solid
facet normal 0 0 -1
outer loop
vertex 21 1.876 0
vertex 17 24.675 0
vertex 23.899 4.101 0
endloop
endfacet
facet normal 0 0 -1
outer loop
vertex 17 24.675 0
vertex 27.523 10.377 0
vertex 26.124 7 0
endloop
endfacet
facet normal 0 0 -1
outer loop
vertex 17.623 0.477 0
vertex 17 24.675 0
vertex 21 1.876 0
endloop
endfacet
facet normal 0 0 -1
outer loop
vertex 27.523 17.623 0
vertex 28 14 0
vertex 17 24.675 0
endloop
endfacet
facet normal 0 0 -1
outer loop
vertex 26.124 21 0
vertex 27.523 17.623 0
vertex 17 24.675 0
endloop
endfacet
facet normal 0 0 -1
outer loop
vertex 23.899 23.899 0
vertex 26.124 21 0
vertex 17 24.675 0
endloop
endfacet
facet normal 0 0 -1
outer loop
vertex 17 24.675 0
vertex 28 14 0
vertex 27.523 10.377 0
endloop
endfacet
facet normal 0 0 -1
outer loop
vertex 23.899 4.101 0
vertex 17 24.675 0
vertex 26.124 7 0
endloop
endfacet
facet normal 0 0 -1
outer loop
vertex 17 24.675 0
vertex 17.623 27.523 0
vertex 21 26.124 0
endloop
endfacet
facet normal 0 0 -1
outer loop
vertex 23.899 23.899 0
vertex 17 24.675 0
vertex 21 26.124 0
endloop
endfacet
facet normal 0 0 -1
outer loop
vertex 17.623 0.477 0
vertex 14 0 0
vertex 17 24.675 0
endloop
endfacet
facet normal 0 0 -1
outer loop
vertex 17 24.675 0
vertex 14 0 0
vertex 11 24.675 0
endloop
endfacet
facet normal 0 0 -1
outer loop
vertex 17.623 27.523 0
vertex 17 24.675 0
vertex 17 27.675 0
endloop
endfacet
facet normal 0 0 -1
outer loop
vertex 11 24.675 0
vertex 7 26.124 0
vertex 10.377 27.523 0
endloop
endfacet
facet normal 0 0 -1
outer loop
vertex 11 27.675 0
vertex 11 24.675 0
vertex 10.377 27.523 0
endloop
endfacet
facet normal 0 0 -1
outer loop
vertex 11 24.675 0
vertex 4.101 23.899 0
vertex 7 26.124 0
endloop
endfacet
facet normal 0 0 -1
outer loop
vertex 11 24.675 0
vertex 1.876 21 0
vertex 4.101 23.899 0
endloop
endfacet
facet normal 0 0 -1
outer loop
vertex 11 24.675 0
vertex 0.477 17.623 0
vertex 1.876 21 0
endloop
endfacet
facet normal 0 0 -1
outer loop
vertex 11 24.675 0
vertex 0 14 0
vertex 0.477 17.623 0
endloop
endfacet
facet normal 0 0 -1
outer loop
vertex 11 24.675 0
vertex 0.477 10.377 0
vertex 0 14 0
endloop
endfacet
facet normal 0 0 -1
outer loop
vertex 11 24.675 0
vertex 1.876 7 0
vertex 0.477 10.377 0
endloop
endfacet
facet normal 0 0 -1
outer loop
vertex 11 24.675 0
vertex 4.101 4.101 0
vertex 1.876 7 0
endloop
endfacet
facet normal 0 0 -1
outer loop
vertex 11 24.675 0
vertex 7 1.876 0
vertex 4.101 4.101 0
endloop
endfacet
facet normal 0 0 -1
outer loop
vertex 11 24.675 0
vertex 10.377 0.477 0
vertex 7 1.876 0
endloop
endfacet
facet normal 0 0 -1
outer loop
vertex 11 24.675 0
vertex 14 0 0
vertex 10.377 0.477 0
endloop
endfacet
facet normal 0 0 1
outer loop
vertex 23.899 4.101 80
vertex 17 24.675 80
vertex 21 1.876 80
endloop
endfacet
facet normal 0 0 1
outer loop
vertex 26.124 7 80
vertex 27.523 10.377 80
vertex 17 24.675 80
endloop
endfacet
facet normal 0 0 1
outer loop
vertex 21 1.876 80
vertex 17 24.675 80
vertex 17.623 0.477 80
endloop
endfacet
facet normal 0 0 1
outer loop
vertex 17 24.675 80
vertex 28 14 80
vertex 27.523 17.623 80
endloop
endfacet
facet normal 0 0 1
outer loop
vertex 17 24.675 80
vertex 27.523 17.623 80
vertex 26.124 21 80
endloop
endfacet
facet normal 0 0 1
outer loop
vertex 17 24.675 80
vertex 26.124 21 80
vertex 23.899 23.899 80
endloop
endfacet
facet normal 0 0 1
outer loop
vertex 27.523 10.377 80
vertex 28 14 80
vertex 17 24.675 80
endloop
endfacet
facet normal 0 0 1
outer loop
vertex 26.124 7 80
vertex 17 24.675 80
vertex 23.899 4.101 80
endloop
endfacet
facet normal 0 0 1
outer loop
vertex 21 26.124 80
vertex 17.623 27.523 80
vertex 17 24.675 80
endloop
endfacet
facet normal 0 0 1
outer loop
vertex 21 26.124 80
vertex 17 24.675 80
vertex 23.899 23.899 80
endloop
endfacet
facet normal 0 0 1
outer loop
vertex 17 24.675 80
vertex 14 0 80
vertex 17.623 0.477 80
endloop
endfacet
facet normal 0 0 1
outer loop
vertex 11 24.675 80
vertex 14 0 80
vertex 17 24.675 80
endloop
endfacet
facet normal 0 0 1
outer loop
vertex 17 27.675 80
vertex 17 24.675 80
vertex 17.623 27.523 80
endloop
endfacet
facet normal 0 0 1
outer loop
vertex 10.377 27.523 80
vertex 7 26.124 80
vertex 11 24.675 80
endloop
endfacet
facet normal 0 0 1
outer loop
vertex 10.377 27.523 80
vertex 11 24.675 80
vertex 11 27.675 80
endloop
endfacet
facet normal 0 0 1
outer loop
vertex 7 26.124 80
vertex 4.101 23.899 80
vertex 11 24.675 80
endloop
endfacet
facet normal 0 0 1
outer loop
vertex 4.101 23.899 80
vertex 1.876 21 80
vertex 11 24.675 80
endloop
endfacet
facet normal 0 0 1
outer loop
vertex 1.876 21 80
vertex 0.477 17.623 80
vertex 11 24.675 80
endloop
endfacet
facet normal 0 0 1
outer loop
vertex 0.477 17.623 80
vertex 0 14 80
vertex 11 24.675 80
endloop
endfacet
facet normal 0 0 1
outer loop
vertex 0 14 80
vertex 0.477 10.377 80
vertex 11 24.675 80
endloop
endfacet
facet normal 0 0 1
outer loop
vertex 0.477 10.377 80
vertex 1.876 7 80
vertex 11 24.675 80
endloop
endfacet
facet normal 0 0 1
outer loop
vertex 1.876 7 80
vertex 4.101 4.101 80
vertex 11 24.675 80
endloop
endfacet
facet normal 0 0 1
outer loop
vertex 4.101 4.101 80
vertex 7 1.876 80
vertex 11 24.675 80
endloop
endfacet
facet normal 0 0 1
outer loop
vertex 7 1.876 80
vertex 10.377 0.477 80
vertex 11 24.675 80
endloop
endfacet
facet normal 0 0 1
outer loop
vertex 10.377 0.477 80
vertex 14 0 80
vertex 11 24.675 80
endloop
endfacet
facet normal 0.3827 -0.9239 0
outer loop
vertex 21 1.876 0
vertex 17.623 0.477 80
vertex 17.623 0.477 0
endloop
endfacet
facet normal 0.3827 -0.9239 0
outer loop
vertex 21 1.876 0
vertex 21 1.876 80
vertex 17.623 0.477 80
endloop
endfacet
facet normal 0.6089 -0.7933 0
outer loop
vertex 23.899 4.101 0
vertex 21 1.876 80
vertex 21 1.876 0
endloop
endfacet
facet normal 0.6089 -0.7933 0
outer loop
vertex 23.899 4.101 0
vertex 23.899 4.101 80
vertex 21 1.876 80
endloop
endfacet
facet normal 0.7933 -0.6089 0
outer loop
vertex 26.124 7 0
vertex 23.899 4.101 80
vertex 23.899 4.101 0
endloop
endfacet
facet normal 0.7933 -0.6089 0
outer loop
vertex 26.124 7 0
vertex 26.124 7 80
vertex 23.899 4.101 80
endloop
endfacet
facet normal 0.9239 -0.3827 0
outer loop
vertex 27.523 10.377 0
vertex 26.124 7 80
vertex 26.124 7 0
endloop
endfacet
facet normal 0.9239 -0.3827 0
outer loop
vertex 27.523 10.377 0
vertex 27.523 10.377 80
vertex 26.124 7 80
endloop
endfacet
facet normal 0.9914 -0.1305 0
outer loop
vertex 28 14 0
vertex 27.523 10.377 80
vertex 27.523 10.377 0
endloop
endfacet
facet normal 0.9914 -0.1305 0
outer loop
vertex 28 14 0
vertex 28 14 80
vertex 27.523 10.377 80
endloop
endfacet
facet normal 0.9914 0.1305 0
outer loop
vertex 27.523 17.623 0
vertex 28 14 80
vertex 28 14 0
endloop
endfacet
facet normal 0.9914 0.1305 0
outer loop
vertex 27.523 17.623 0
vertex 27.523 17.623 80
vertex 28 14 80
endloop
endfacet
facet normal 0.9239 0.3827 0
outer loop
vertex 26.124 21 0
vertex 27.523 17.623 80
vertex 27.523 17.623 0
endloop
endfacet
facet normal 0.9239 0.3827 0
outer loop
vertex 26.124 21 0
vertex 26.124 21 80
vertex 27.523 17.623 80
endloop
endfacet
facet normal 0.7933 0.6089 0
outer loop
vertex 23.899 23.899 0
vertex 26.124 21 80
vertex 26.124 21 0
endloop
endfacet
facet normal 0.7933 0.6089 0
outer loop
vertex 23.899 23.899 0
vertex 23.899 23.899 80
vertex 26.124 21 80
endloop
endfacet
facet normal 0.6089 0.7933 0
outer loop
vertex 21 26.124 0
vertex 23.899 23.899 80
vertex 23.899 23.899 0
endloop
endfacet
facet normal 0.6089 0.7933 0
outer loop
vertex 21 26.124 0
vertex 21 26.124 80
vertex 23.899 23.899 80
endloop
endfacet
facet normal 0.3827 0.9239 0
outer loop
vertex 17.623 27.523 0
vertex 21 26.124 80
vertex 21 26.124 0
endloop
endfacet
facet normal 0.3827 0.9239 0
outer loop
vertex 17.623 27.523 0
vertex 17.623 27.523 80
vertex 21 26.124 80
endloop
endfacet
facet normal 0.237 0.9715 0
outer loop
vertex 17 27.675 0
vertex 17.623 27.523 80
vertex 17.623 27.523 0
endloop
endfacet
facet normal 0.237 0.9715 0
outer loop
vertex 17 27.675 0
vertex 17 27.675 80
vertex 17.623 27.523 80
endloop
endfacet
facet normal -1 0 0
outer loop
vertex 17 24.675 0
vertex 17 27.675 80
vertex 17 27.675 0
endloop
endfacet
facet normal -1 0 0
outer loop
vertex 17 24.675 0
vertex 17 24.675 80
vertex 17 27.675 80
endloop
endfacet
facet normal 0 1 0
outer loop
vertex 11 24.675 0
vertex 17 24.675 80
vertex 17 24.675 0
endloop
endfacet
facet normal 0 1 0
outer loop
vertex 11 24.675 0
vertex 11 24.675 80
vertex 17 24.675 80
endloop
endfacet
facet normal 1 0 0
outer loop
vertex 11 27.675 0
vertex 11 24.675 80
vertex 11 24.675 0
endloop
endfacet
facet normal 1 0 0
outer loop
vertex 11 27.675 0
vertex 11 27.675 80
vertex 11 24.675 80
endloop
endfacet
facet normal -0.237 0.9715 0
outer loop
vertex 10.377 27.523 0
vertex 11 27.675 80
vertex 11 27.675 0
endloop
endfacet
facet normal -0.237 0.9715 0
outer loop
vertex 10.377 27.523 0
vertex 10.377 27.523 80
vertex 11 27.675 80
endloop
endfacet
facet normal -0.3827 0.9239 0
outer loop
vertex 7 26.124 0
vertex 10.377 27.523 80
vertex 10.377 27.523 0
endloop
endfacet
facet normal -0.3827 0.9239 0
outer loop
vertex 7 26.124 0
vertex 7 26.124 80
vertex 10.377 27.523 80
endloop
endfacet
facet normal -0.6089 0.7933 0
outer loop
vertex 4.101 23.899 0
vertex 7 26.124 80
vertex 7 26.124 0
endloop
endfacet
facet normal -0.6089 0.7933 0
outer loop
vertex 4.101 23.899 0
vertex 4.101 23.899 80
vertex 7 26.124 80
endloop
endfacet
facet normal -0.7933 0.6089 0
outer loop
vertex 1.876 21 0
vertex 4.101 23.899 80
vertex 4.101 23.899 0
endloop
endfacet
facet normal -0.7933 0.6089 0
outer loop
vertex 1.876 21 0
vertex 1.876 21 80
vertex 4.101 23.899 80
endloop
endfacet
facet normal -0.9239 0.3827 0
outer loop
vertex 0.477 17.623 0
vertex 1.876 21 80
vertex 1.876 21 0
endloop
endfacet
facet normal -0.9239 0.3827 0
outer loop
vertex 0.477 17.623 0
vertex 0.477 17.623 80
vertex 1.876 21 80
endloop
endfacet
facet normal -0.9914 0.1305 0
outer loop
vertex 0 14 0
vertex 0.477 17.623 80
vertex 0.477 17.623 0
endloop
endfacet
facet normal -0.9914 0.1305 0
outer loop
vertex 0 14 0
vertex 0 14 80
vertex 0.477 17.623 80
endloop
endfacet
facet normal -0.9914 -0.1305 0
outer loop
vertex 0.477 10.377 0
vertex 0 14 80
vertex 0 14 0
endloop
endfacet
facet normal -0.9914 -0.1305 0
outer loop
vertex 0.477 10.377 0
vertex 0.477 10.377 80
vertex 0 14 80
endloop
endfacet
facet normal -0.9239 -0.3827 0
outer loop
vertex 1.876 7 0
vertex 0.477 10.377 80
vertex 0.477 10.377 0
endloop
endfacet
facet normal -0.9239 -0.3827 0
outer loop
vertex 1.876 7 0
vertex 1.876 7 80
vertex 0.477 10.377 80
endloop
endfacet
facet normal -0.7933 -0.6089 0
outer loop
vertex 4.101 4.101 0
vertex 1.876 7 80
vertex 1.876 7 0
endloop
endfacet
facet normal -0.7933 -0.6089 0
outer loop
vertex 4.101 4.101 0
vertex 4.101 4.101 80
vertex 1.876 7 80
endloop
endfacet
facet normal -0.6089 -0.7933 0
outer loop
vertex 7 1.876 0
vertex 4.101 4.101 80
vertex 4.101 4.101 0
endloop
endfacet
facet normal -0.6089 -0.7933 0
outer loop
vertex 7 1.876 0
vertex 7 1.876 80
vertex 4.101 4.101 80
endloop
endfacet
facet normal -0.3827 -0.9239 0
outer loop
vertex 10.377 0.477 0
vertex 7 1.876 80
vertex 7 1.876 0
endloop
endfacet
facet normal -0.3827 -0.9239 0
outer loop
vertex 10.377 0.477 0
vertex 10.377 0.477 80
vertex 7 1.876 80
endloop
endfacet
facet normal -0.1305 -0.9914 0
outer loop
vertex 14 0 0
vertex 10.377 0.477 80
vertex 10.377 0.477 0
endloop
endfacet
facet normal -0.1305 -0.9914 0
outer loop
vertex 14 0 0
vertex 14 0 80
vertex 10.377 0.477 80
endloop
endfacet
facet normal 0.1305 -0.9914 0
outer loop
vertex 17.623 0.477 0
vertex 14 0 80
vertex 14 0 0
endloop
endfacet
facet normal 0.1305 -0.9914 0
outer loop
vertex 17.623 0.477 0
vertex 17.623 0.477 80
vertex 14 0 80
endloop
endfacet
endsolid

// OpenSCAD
$fn = 32;

// ----------------------------------------------------------------------
// Keyway shaft: d28 shaft, key 6 x 3 mm
// ----------------------------------------------------------------------

// --- parameters (mm) ---
shaft_r = 14;             // shaft radius
key_w = 6;                // keyway width
key_d = 3;                // keyway depth below the surface line
plate_t = 80;             // shaft length, Z (extrusion height)
fit_tol = 0.1;            // declared fit tolerance (prompt contract)
free_tol = 0.3;           // declared free tolerance (prompt contract)

shaft_d = 2 * shaft_r;  // shaft diameter
circle_step = 15;  // polygon sampling step, degrees

profile = [[10.377, 27.523], [7, 26.124], [4.101, 23.899], [1.876, 21], [0.477, 17.623], [0, 14], [0.477, 10.377], [1.876, 7], [4.101, 4.101], [7, 1.876], [10.377, 0.477], [14, 0], [17.623, 0.477], [21, 1.876], [23.899, 4.101], [26.124, 7], [27.523, 10.377], [28, 14], [27.523, 17.623], [26.124, 21], [23.899, 23.899], [21, 26.124], [17.623, 27.523], [17, 27.675], [17, 24.675], [11, 24.675], [11, 27.675]];  // primary outline, 27 points, counter clockwise

// --- the one profile operation ---
linear_extrude(height = plate_t) polygon(points = profile);
